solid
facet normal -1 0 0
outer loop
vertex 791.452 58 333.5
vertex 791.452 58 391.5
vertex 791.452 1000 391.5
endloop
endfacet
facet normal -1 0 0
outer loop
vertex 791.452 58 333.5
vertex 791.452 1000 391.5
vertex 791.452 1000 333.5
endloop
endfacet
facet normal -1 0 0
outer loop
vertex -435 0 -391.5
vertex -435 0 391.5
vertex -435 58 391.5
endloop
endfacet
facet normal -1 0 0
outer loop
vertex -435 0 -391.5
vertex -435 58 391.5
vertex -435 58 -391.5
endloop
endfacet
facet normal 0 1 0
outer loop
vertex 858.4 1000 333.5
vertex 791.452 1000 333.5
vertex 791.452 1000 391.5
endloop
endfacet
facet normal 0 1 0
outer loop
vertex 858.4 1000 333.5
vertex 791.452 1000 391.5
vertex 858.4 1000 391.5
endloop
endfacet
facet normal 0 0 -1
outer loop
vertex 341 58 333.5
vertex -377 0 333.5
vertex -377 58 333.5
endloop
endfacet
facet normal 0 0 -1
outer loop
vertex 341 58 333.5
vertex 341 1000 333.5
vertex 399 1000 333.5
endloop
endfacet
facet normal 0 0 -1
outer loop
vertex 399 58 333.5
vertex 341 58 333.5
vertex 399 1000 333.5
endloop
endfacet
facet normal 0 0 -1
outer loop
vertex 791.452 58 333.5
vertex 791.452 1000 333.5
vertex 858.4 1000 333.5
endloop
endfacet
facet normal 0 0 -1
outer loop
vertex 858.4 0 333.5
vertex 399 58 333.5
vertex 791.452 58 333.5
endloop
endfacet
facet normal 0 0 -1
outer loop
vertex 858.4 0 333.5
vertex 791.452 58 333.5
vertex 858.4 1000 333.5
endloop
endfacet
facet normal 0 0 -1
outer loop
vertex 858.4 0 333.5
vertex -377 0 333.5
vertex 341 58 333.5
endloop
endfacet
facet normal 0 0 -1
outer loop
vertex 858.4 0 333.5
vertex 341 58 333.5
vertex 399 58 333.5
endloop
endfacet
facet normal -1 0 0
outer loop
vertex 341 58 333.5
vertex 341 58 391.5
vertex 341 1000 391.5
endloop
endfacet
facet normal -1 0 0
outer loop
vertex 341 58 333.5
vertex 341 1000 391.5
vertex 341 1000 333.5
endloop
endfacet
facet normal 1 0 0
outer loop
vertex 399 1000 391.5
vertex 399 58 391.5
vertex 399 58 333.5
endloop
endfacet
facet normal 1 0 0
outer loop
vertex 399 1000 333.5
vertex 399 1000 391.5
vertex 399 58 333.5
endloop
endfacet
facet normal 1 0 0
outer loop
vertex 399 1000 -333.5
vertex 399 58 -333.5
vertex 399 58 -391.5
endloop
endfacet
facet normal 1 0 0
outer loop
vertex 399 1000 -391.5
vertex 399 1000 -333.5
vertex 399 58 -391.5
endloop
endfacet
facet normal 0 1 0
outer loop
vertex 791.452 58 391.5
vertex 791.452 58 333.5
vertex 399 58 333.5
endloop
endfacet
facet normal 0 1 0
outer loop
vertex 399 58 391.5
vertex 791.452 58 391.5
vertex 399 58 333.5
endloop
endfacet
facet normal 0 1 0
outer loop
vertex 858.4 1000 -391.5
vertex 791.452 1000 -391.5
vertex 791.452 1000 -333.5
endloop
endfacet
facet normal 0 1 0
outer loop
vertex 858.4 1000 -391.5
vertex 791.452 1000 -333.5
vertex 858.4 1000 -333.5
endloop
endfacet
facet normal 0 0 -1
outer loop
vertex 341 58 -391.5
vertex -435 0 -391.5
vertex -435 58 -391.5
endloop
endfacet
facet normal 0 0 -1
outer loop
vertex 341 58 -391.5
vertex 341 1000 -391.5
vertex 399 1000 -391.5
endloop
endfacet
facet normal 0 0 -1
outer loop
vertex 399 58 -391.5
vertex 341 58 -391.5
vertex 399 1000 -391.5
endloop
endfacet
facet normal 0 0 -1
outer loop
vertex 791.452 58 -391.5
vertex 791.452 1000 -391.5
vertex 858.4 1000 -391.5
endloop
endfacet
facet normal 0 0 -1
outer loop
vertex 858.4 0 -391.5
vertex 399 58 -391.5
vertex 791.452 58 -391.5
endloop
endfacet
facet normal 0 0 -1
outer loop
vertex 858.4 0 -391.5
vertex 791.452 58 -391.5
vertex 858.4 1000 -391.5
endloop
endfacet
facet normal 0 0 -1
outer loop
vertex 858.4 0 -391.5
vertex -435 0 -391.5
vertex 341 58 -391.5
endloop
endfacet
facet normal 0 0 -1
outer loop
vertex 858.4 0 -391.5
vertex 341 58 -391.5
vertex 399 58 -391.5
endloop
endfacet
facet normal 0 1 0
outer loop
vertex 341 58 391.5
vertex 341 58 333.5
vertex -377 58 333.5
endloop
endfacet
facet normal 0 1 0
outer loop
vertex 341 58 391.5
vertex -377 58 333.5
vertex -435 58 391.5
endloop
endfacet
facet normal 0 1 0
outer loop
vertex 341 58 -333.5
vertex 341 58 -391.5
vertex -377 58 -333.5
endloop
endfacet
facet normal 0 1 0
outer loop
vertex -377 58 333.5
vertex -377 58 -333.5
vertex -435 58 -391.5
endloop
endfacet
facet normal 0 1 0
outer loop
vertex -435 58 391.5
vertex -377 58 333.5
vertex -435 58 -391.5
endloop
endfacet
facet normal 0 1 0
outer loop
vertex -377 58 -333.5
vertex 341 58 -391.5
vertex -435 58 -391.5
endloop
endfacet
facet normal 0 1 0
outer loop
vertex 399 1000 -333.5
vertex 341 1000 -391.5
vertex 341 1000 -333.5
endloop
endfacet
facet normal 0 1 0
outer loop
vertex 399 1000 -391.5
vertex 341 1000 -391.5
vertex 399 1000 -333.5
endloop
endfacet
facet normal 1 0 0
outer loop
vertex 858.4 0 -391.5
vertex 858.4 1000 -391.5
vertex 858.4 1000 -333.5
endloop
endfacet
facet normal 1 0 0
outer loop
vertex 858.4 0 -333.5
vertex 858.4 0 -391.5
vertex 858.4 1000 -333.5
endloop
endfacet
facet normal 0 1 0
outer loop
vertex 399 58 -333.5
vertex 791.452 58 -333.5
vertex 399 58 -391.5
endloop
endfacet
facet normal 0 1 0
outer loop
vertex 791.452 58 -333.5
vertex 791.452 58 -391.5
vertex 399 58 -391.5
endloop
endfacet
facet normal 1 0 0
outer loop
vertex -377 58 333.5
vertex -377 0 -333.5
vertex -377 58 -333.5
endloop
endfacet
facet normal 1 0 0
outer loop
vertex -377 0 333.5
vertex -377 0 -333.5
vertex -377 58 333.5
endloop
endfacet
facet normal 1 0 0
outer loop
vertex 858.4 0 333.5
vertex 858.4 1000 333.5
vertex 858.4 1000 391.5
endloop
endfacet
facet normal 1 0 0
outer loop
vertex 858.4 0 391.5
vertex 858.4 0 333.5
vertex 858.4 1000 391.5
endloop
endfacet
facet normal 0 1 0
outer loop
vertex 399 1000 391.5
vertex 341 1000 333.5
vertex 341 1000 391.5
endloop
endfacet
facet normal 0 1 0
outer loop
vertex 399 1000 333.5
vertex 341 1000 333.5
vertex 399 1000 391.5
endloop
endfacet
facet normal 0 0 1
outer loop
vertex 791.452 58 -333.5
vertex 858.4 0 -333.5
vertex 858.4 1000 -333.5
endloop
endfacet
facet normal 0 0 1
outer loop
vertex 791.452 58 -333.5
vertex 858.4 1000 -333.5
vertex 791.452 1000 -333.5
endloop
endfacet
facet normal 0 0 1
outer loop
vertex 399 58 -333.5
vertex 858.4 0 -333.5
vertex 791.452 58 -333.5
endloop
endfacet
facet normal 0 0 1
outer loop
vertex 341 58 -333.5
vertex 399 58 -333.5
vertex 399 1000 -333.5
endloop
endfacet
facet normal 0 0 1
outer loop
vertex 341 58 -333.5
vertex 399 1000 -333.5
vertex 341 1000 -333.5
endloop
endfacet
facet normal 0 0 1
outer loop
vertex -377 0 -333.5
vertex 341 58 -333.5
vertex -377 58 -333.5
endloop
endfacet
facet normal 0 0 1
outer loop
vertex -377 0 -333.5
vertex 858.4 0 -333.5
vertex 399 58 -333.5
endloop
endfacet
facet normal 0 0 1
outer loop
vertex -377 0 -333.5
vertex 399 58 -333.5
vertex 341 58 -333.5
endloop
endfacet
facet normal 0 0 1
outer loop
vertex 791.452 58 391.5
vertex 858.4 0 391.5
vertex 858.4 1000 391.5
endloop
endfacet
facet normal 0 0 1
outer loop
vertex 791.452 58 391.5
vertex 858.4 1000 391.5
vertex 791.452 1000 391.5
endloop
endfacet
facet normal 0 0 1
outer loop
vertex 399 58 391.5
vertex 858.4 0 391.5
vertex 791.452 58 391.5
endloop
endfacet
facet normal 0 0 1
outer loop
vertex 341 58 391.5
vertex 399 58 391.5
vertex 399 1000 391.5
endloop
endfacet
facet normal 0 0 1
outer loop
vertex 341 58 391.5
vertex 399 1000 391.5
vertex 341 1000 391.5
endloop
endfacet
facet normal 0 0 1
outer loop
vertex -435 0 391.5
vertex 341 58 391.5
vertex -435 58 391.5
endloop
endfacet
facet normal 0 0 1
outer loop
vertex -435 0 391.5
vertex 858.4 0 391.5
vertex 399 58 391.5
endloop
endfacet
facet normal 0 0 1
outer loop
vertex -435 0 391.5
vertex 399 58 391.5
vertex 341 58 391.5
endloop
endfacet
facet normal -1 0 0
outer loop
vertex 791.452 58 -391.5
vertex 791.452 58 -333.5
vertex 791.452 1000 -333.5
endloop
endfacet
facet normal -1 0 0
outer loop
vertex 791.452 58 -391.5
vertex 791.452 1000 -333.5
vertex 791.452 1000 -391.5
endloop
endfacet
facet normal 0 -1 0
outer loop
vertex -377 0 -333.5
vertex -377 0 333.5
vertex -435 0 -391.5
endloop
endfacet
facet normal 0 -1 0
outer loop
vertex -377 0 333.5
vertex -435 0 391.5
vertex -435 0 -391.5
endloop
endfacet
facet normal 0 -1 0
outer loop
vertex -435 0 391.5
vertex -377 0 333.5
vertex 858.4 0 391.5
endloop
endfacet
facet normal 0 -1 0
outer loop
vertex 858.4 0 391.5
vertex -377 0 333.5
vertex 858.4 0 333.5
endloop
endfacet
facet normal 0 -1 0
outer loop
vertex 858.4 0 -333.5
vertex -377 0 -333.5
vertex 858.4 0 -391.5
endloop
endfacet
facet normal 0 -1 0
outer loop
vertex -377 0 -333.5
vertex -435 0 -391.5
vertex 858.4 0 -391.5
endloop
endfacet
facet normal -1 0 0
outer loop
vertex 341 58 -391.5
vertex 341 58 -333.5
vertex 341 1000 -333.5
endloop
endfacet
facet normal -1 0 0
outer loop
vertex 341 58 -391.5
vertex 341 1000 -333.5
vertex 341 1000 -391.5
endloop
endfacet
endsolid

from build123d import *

# Parameters (mm, degrees)
SALIENTE_EXTRUIR1_DEPTH = 58
CROQUIS3_W              = 58
CROQUIS3_H              = 58
CROQUIS3_W_2            = 66.947748122
SALIENTE_EXTRUIR2_DEPTH = 1000


with BuildPart() as part:
    # Croquis2 → Saliente-Extruir1 (new body)
    with BuildSketch(Plane(origin=(0, 0, 0), x_dir=(1, 0, 0), z_dir=(0, 1, 0))):
        Polygon((858.4, -333.5), (858.4, -391.5), (-435, -391.5), (-435, 391.5), (858.4, 391.5), (858.4, 333.5), (-377, 333.5), (-377, -333.5), align=None)
    extrude(amount=SALIENTE_EXTRUIR1_DEPTH)

    # Croquis3 → Saliente-Extruir2 (add)
    with BuildSketch(Plane(origin=(0, 0, 0), x_dir=(1, 0, 0), z_dir=(0, 1, 0))):
        with Locations((370, 362.5)):
            Rectangle(CROQUIS3_W, CROQUIS3_H)
        with Locations((824.926125939, 362.5)):
            Rectangle(CROQUIS3_W_2, CROQUIS3_H)
        with Locations((824.926125939, -362.5)):
            Rectangle(CROQUIS3_W_2, CROQUIS3_H)
        with Locations((370, -362.5)):
            Rectangle(CROQUIS3_W, CROQUIS3_H)
    extrude(amount=SALIENTE_EXTRUIR2_DEPTH)


solid = part.part
